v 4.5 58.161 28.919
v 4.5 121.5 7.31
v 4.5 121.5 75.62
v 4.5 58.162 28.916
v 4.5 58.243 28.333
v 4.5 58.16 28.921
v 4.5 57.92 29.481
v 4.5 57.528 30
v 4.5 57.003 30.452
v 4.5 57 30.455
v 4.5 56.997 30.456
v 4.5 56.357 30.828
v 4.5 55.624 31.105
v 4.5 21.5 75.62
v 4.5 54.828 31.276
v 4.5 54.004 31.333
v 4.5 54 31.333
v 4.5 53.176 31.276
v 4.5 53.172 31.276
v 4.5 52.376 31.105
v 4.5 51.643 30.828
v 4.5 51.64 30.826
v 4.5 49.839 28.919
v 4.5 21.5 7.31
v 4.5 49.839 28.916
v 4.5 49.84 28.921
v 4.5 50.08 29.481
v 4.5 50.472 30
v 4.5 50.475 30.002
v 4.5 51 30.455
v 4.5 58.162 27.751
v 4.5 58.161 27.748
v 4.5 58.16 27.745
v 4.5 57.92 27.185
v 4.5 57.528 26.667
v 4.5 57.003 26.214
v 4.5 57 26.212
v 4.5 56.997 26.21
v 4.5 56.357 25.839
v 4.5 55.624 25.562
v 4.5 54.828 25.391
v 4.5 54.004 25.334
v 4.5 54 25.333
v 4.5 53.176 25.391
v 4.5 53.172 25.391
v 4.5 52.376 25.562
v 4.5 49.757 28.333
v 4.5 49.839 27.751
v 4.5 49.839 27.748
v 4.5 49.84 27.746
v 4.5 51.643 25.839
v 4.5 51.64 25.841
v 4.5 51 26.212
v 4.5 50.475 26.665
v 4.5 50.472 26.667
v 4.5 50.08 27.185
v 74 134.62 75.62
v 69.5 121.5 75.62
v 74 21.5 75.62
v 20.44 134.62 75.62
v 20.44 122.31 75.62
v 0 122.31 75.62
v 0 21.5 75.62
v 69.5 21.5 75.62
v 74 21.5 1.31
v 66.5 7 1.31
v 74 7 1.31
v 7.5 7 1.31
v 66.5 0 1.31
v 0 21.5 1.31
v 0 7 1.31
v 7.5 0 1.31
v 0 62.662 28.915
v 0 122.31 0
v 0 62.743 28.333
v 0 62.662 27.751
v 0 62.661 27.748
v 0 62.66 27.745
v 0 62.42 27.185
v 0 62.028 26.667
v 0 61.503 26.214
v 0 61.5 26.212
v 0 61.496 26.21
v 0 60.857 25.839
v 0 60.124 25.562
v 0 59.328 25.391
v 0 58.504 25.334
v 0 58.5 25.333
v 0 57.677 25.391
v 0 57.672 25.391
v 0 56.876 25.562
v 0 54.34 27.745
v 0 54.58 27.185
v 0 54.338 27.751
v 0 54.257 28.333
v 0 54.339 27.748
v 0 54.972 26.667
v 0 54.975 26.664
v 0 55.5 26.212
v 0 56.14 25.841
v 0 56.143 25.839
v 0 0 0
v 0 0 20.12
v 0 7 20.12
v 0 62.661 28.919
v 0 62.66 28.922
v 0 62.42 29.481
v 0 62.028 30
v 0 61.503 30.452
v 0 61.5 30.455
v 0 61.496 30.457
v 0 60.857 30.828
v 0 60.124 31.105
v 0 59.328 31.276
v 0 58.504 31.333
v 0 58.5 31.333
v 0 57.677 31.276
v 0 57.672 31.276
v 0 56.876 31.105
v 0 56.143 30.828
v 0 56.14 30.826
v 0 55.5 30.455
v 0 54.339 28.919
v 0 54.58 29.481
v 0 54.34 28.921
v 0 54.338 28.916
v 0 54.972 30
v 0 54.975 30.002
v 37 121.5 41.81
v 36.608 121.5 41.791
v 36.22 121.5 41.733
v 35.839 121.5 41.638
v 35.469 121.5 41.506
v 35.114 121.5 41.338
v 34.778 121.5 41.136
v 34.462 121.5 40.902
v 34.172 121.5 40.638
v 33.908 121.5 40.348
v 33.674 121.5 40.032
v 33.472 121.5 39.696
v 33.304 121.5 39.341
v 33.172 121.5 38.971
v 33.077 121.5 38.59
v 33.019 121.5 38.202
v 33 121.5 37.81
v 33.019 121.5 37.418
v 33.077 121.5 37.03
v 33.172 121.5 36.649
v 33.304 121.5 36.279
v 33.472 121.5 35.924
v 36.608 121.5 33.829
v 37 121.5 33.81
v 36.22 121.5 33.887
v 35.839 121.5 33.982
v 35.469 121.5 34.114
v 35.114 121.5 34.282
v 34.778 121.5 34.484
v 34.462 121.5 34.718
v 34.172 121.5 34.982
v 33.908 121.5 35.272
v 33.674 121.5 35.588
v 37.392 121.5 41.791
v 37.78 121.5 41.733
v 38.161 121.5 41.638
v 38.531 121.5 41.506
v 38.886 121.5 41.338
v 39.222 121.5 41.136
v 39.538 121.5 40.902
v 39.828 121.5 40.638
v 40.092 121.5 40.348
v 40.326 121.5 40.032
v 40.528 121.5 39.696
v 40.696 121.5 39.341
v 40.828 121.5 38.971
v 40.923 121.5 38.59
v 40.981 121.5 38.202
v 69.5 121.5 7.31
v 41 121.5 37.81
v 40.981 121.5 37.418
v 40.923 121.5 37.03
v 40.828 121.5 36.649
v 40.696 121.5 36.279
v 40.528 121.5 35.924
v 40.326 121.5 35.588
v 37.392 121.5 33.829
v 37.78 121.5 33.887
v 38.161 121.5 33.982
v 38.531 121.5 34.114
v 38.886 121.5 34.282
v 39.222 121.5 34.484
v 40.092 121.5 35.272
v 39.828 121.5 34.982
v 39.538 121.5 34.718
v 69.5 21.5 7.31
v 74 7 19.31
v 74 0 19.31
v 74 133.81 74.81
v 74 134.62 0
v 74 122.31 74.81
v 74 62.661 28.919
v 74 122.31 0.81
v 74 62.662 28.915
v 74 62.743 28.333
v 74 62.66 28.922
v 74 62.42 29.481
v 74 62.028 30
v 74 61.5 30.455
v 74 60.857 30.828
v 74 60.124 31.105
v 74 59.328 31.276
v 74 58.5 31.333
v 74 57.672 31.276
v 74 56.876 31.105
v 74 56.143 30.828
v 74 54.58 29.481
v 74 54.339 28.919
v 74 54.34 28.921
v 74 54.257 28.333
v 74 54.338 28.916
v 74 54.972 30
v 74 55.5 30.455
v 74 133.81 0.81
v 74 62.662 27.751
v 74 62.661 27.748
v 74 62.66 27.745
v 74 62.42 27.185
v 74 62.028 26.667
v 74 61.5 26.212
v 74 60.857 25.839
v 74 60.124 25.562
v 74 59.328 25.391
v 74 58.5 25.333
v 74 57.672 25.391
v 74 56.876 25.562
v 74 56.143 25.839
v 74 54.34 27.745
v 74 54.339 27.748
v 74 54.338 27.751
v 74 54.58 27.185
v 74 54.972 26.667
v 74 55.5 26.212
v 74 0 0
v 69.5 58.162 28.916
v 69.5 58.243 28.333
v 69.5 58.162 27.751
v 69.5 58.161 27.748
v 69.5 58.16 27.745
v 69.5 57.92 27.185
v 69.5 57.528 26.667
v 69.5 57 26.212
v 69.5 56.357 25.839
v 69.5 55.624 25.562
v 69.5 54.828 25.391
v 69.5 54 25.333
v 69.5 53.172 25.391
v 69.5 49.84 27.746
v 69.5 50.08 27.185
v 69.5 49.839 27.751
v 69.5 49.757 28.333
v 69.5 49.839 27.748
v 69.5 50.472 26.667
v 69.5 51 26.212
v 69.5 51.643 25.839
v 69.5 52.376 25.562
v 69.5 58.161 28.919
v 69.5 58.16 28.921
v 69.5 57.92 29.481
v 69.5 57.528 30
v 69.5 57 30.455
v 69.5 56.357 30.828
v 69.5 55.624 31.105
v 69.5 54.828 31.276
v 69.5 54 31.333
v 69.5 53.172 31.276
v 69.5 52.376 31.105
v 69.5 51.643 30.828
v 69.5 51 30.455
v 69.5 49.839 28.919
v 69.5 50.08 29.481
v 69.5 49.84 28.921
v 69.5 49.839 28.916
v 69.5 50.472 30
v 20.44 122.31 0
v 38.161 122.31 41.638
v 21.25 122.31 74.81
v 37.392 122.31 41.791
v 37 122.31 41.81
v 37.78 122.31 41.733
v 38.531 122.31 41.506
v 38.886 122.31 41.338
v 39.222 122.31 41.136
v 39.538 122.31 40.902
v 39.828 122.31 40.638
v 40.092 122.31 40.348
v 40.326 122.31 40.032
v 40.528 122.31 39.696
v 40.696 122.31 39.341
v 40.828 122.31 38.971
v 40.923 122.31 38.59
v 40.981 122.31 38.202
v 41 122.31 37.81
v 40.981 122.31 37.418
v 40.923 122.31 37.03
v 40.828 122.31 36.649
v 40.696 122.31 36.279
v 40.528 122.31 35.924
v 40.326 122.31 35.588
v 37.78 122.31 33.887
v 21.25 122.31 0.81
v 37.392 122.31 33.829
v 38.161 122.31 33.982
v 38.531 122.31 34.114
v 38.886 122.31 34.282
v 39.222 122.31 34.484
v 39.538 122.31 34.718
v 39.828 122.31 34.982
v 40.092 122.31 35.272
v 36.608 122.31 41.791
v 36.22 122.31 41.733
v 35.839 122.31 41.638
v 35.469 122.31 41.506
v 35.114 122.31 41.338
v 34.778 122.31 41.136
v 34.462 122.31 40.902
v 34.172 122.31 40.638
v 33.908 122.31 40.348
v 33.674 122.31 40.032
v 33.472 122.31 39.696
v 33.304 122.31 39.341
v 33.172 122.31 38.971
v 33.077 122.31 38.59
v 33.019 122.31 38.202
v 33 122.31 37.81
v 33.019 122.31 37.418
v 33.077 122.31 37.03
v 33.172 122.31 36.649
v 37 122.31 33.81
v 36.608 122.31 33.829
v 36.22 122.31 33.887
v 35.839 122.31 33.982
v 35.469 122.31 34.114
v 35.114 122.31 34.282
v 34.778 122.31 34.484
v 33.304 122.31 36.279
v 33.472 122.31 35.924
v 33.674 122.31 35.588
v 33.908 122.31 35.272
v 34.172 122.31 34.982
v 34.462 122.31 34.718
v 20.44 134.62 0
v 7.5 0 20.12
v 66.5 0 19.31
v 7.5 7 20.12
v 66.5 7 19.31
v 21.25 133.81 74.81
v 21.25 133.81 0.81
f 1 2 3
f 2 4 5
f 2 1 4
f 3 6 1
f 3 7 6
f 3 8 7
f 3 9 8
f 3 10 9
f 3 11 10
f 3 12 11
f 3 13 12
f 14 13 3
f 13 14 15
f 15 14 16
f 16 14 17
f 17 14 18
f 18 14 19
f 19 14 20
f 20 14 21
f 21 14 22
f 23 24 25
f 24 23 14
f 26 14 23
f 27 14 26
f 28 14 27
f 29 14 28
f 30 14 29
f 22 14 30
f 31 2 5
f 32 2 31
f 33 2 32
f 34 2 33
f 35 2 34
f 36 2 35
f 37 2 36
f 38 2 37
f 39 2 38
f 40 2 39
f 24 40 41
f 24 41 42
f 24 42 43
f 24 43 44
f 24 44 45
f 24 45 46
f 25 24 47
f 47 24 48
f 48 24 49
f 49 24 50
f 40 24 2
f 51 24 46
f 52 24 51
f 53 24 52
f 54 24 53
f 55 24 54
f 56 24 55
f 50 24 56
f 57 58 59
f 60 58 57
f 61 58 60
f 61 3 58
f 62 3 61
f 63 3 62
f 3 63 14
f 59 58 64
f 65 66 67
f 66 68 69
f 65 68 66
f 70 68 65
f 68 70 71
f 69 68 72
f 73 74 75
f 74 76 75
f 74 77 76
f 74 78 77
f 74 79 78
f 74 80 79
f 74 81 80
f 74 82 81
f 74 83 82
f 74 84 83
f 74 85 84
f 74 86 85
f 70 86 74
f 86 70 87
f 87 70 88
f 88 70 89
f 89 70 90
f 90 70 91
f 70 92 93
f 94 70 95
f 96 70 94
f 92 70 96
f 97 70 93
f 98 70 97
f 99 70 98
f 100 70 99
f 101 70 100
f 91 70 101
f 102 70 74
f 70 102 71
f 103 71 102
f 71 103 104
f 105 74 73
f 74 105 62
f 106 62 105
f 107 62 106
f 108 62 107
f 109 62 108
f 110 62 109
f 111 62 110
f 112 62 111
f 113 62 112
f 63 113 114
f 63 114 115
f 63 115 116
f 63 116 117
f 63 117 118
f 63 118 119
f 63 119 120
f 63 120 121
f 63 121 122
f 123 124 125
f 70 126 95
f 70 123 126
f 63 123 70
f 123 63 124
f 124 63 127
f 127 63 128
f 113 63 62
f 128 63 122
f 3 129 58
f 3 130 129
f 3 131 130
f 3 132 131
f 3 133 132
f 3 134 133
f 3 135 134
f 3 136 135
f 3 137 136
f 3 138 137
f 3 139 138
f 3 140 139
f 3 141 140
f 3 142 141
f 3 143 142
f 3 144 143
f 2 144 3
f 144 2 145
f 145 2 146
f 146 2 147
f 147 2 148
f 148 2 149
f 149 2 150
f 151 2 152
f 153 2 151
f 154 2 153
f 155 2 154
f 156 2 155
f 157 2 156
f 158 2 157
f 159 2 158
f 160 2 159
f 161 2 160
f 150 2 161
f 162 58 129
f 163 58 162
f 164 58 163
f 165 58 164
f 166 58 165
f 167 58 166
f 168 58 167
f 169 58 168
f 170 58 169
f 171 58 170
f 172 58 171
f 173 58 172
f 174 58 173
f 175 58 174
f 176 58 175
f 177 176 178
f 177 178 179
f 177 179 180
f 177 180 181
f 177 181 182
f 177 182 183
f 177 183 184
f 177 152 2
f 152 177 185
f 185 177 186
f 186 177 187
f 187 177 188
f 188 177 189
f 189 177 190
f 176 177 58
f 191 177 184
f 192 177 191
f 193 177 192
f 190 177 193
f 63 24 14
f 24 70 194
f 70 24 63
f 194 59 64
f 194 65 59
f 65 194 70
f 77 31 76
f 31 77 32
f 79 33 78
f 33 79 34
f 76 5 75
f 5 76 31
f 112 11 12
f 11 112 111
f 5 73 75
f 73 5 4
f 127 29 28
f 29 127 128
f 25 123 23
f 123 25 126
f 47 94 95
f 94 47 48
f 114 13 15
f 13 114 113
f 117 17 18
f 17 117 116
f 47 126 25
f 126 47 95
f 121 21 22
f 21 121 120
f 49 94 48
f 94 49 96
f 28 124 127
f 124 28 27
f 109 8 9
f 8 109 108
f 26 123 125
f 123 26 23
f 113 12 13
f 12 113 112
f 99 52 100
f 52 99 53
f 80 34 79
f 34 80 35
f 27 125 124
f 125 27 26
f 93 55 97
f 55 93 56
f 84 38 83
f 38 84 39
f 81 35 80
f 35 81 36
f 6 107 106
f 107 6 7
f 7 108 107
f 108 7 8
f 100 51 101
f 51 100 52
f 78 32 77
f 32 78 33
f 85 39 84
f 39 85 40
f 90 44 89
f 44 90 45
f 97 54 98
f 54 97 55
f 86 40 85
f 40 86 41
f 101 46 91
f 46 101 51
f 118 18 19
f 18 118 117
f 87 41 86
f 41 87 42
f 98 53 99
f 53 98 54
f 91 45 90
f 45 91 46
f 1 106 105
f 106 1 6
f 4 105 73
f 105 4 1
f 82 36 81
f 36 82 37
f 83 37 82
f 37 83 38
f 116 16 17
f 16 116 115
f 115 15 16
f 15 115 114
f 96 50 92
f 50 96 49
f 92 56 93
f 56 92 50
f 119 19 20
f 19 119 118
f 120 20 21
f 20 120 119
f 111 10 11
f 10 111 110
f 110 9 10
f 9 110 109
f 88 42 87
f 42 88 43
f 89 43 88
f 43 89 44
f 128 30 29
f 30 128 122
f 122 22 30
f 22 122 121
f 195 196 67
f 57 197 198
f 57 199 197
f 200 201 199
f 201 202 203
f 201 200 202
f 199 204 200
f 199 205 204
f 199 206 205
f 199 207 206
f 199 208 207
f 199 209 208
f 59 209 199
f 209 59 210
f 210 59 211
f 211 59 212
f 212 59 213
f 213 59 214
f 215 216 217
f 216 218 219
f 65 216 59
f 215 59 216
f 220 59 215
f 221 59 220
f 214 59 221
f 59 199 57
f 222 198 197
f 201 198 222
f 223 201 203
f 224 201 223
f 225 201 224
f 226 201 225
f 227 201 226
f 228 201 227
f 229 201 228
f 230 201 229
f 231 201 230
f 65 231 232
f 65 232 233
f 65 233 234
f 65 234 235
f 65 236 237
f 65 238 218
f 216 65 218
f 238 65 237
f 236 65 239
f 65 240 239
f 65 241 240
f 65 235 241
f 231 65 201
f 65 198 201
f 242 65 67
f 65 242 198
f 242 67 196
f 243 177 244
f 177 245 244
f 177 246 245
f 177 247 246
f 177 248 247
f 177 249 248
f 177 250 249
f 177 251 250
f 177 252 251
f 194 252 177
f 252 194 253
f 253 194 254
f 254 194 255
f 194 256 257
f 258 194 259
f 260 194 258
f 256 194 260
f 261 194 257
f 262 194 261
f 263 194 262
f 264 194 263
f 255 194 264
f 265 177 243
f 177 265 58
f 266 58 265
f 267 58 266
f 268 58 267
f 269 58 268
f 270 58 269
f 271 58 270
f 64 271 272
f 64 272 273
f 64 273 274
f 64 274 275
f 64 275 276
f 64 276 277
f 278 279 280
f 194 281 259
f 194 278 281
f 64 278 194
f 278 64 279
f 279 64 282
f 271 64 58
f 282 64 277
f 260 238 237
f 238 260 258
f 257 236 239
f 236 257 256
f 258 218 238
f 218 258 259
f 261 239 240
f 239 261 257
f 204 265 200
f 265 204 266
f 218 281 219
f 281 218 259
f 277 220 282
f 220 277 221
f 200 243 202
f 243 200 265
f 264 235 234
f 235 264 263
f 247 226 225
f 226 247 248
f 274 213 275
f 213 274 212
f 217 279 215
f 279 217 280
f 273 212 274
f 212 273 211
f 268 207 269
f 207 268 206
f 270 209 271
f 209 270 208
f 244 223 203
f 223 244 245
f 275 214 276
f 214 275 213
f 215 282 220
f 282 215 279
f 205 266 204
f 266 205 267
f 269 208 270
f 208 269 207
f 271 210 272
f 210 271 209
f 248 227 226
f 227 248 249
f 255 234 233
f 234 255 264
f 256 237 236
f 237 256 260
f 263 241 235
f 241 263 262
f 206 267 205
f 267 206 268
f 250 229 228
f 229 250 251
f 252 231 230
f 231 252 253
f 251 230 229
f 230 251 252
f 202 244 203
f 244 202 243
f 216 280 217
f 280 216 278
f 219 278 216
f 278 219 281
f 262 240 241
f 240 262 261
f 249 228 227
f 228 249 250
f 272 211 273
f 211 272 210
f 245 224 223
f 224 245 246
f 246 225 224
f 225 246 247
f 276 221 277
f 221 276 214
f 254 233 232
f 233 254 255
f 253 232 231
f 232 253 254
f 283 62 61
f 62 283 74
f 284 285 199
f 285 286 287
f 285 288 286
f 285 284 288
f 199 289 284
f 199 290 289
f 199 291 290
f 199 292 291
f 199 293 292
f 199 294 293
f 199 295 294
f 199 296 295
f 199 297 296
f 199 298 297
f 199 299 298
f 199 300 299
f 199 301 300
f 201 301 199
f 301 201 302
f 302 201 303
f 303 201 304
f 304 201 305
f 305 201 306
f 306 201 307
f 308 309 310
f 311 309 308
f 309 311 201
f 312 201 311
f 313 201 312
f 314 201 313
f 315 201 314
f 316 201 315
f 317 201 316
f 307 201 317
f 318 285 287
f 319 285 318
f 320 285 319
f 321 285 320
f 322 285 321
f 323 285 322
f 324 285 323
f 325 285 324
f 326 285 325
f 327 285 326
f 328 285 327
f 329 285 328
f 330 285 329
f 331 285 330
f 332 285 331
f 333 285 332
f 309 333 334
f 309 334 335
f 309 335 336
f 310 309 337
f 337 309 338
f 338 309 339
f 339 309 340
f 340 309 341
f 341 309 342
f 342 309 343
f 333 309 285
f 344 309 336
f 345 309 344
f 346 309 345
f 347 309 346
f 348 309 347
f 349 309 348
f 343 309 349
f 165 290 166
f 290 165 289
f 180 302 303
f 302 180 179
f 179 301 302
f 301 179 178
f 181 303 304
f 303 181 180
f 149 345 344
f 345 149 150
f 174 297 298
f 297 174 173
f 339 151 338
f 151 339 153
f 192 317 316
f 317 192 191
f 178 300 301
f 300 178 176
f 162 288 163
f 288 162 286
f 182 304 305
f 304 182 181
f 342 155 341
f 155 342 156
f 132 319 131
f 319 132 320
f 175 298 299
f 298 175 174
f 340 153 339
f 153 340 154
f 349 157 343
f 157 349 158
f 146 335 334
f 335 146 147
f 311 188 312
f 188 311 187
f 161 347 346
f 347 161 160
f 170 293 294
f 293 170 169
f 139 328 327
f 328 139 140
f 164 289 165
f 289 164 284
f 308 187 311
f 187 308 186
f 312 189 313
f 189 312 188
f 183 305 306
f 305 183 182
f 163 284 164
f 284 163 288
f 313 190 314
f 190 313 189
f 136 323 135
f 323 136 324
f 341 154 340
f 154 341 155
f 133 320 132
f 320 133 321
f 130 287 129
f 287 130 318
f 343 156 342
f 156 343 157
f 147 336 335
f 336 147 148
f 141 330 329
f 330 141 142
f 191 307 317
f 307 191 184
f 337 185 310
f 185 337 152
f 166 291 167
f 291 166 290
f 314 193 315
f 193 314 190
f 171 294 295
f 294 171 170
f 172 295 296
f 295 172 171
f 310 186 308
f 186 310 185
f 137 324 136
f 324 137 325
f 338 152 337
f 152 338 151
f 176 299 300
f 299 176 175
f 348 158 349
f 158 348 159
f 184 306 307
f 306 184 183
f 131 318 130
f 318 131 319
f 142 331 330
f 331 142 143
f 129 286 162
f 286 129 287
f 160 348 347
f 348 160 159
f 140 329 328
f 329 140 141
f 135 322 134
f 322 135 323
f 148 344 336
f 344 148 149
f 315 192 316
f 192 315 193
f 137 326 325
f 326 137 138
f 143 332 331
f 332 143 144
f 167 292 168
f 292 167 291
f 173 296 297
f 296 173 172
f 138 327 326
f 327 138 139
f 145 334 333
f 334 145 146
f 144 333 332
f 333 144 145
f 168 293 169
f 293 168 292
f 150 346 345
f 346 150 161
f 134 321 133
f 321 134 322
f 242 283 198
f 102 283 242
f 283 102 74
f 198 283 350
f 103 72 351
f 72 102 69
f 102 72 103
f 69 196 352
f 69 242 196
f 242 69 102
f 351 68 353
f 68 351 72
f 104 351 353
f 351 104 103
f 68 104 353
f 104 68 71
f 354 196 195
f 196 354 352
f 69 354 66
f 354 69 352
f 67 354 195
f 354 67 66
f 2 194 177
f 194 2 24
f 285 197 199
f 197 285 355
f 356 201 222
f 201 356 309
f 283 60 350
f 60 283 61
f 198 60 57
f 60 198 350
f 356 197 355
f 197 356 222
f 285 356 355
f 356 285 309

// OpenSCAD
// file: ../../utilities/dictionary_get.scad
/**
 * Retrieves a value by its key from an array representing a dictionary.
 * @param dictionary An array representing a dictionary.  Its contents must be
 *                   two-item arrays, each containing a key, then a value.
 * @param key        The key of the value to retrieve.
 * @return           The value matching the specified key.
 * @throws           When the key is not in the dictionary.
 * @throws           When the key is present in the dictionary multiple times.
 */
function dictionary_get(dictionary, key) =
  assert(
    len([for (item = dictionary) if (item[0] == key) item]) >= 1,
    "The given key was not found in the given dictionary"
  )
  assert(
    len([for (item = dictionary) if (item[0] == key) item]) <= 1,
    "The given key was found multiple times in the given dictionary"
  )
  [for (item = dictionary) if (item[0] == key) item][0][1];
// file: ../consoles/game_boy_color_console.scad
function game_boy_color_console() = [
  [
    "cartridge",
    [
      ["width_mm", 59],
      ["protrusion_mm", 18],
      ["depth_mm", 7],
    ],
  ],
  [
    "body",
    [
      ["width_mm", 74],
      ["depth_mm", 14.5],
    ],
  ],
  [
    "screen",
    [
      ["top_inset_mm", 6],
      ["width_mm", 65],
      ["height_mm", 61],
    ],
  ],
];
// file: ../cameras/wileyfox_swift_camera.scad
function wileyfox_swift_camera() = [
  ["distance_mm", 100],
  ["depth_mm", 11.5],
  ["width_mm", 74],
  [
    "apeture",
    [
      ["inset_mm", 15.75],
      ["diameter_mm", 8],
      ["sides", 64],
    ],
  ],
];
// main file
use <../cameras/wileyfox_swift_camera.scad>;
use <../consoles/game_boy_color_console.scad>;
use <../shroud.scad>;

shroud([
  ["camera", wileyfox_swift_camera()],
  ["console", game_boy_color_console()],
  ["wall_thickness_mm", 0.81],
  [
    "led",
    [
      ["diameter_mm", 6],
      ["sides", 32],
    ],
  ],
]);
